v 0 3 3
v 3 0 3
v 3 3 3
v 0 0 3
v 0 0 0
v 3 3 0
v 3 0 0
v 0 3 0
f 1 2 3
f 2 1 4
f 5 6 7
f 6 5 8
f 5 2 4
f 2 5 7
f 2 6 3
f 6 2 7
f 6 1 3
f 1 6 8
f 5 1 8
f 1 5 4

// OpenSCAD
// SYMPTOM: offset() of an empty/degenerate 2D region aborted the WHOLE import.
//   t2d__offset-tests ends with `offset(r=1) square([0,0]);`; the import died at
//   parse with `RuntimeError: shape is invalid`, losing all 20+ valid offset
//   results in the file (Category C: a hard error, no STEP produced).
// CAUSE: square([0,0]) is non-positive, so p_square_action builds a NULL shape
//   (Part.Shape(), the bf901fb45e degenerate-square fix). p_offset_action then
//   read `subobj.Shape.Volume` unconditionally (importCSG.py ~L453); .Volume on
//   a null shape raises "shape is invalid". The childless-offset guard above
//   (len(p[6])==0) does not catch a present-but-null child.
// FIX: importCSG.py p_offset_action -> add a `subobj.Shape.isNull()` guard
//   BEFORE the .Volume test: consume the subtree and render empty (offsetting an
//   empty region yields nothing), matching the childless and 3D-child paths.
//   Commit <C2-HASH>.
// EXPECTED (OpenSCAD): offset() of an empty 2D region is empty; it does not abort
//   the model. Sibling geometry (here cube([3,3,3]), volume 27) is unaffected.
offset(r = 1)
	square([0, 0]);
cube([3, 3, 3]);
